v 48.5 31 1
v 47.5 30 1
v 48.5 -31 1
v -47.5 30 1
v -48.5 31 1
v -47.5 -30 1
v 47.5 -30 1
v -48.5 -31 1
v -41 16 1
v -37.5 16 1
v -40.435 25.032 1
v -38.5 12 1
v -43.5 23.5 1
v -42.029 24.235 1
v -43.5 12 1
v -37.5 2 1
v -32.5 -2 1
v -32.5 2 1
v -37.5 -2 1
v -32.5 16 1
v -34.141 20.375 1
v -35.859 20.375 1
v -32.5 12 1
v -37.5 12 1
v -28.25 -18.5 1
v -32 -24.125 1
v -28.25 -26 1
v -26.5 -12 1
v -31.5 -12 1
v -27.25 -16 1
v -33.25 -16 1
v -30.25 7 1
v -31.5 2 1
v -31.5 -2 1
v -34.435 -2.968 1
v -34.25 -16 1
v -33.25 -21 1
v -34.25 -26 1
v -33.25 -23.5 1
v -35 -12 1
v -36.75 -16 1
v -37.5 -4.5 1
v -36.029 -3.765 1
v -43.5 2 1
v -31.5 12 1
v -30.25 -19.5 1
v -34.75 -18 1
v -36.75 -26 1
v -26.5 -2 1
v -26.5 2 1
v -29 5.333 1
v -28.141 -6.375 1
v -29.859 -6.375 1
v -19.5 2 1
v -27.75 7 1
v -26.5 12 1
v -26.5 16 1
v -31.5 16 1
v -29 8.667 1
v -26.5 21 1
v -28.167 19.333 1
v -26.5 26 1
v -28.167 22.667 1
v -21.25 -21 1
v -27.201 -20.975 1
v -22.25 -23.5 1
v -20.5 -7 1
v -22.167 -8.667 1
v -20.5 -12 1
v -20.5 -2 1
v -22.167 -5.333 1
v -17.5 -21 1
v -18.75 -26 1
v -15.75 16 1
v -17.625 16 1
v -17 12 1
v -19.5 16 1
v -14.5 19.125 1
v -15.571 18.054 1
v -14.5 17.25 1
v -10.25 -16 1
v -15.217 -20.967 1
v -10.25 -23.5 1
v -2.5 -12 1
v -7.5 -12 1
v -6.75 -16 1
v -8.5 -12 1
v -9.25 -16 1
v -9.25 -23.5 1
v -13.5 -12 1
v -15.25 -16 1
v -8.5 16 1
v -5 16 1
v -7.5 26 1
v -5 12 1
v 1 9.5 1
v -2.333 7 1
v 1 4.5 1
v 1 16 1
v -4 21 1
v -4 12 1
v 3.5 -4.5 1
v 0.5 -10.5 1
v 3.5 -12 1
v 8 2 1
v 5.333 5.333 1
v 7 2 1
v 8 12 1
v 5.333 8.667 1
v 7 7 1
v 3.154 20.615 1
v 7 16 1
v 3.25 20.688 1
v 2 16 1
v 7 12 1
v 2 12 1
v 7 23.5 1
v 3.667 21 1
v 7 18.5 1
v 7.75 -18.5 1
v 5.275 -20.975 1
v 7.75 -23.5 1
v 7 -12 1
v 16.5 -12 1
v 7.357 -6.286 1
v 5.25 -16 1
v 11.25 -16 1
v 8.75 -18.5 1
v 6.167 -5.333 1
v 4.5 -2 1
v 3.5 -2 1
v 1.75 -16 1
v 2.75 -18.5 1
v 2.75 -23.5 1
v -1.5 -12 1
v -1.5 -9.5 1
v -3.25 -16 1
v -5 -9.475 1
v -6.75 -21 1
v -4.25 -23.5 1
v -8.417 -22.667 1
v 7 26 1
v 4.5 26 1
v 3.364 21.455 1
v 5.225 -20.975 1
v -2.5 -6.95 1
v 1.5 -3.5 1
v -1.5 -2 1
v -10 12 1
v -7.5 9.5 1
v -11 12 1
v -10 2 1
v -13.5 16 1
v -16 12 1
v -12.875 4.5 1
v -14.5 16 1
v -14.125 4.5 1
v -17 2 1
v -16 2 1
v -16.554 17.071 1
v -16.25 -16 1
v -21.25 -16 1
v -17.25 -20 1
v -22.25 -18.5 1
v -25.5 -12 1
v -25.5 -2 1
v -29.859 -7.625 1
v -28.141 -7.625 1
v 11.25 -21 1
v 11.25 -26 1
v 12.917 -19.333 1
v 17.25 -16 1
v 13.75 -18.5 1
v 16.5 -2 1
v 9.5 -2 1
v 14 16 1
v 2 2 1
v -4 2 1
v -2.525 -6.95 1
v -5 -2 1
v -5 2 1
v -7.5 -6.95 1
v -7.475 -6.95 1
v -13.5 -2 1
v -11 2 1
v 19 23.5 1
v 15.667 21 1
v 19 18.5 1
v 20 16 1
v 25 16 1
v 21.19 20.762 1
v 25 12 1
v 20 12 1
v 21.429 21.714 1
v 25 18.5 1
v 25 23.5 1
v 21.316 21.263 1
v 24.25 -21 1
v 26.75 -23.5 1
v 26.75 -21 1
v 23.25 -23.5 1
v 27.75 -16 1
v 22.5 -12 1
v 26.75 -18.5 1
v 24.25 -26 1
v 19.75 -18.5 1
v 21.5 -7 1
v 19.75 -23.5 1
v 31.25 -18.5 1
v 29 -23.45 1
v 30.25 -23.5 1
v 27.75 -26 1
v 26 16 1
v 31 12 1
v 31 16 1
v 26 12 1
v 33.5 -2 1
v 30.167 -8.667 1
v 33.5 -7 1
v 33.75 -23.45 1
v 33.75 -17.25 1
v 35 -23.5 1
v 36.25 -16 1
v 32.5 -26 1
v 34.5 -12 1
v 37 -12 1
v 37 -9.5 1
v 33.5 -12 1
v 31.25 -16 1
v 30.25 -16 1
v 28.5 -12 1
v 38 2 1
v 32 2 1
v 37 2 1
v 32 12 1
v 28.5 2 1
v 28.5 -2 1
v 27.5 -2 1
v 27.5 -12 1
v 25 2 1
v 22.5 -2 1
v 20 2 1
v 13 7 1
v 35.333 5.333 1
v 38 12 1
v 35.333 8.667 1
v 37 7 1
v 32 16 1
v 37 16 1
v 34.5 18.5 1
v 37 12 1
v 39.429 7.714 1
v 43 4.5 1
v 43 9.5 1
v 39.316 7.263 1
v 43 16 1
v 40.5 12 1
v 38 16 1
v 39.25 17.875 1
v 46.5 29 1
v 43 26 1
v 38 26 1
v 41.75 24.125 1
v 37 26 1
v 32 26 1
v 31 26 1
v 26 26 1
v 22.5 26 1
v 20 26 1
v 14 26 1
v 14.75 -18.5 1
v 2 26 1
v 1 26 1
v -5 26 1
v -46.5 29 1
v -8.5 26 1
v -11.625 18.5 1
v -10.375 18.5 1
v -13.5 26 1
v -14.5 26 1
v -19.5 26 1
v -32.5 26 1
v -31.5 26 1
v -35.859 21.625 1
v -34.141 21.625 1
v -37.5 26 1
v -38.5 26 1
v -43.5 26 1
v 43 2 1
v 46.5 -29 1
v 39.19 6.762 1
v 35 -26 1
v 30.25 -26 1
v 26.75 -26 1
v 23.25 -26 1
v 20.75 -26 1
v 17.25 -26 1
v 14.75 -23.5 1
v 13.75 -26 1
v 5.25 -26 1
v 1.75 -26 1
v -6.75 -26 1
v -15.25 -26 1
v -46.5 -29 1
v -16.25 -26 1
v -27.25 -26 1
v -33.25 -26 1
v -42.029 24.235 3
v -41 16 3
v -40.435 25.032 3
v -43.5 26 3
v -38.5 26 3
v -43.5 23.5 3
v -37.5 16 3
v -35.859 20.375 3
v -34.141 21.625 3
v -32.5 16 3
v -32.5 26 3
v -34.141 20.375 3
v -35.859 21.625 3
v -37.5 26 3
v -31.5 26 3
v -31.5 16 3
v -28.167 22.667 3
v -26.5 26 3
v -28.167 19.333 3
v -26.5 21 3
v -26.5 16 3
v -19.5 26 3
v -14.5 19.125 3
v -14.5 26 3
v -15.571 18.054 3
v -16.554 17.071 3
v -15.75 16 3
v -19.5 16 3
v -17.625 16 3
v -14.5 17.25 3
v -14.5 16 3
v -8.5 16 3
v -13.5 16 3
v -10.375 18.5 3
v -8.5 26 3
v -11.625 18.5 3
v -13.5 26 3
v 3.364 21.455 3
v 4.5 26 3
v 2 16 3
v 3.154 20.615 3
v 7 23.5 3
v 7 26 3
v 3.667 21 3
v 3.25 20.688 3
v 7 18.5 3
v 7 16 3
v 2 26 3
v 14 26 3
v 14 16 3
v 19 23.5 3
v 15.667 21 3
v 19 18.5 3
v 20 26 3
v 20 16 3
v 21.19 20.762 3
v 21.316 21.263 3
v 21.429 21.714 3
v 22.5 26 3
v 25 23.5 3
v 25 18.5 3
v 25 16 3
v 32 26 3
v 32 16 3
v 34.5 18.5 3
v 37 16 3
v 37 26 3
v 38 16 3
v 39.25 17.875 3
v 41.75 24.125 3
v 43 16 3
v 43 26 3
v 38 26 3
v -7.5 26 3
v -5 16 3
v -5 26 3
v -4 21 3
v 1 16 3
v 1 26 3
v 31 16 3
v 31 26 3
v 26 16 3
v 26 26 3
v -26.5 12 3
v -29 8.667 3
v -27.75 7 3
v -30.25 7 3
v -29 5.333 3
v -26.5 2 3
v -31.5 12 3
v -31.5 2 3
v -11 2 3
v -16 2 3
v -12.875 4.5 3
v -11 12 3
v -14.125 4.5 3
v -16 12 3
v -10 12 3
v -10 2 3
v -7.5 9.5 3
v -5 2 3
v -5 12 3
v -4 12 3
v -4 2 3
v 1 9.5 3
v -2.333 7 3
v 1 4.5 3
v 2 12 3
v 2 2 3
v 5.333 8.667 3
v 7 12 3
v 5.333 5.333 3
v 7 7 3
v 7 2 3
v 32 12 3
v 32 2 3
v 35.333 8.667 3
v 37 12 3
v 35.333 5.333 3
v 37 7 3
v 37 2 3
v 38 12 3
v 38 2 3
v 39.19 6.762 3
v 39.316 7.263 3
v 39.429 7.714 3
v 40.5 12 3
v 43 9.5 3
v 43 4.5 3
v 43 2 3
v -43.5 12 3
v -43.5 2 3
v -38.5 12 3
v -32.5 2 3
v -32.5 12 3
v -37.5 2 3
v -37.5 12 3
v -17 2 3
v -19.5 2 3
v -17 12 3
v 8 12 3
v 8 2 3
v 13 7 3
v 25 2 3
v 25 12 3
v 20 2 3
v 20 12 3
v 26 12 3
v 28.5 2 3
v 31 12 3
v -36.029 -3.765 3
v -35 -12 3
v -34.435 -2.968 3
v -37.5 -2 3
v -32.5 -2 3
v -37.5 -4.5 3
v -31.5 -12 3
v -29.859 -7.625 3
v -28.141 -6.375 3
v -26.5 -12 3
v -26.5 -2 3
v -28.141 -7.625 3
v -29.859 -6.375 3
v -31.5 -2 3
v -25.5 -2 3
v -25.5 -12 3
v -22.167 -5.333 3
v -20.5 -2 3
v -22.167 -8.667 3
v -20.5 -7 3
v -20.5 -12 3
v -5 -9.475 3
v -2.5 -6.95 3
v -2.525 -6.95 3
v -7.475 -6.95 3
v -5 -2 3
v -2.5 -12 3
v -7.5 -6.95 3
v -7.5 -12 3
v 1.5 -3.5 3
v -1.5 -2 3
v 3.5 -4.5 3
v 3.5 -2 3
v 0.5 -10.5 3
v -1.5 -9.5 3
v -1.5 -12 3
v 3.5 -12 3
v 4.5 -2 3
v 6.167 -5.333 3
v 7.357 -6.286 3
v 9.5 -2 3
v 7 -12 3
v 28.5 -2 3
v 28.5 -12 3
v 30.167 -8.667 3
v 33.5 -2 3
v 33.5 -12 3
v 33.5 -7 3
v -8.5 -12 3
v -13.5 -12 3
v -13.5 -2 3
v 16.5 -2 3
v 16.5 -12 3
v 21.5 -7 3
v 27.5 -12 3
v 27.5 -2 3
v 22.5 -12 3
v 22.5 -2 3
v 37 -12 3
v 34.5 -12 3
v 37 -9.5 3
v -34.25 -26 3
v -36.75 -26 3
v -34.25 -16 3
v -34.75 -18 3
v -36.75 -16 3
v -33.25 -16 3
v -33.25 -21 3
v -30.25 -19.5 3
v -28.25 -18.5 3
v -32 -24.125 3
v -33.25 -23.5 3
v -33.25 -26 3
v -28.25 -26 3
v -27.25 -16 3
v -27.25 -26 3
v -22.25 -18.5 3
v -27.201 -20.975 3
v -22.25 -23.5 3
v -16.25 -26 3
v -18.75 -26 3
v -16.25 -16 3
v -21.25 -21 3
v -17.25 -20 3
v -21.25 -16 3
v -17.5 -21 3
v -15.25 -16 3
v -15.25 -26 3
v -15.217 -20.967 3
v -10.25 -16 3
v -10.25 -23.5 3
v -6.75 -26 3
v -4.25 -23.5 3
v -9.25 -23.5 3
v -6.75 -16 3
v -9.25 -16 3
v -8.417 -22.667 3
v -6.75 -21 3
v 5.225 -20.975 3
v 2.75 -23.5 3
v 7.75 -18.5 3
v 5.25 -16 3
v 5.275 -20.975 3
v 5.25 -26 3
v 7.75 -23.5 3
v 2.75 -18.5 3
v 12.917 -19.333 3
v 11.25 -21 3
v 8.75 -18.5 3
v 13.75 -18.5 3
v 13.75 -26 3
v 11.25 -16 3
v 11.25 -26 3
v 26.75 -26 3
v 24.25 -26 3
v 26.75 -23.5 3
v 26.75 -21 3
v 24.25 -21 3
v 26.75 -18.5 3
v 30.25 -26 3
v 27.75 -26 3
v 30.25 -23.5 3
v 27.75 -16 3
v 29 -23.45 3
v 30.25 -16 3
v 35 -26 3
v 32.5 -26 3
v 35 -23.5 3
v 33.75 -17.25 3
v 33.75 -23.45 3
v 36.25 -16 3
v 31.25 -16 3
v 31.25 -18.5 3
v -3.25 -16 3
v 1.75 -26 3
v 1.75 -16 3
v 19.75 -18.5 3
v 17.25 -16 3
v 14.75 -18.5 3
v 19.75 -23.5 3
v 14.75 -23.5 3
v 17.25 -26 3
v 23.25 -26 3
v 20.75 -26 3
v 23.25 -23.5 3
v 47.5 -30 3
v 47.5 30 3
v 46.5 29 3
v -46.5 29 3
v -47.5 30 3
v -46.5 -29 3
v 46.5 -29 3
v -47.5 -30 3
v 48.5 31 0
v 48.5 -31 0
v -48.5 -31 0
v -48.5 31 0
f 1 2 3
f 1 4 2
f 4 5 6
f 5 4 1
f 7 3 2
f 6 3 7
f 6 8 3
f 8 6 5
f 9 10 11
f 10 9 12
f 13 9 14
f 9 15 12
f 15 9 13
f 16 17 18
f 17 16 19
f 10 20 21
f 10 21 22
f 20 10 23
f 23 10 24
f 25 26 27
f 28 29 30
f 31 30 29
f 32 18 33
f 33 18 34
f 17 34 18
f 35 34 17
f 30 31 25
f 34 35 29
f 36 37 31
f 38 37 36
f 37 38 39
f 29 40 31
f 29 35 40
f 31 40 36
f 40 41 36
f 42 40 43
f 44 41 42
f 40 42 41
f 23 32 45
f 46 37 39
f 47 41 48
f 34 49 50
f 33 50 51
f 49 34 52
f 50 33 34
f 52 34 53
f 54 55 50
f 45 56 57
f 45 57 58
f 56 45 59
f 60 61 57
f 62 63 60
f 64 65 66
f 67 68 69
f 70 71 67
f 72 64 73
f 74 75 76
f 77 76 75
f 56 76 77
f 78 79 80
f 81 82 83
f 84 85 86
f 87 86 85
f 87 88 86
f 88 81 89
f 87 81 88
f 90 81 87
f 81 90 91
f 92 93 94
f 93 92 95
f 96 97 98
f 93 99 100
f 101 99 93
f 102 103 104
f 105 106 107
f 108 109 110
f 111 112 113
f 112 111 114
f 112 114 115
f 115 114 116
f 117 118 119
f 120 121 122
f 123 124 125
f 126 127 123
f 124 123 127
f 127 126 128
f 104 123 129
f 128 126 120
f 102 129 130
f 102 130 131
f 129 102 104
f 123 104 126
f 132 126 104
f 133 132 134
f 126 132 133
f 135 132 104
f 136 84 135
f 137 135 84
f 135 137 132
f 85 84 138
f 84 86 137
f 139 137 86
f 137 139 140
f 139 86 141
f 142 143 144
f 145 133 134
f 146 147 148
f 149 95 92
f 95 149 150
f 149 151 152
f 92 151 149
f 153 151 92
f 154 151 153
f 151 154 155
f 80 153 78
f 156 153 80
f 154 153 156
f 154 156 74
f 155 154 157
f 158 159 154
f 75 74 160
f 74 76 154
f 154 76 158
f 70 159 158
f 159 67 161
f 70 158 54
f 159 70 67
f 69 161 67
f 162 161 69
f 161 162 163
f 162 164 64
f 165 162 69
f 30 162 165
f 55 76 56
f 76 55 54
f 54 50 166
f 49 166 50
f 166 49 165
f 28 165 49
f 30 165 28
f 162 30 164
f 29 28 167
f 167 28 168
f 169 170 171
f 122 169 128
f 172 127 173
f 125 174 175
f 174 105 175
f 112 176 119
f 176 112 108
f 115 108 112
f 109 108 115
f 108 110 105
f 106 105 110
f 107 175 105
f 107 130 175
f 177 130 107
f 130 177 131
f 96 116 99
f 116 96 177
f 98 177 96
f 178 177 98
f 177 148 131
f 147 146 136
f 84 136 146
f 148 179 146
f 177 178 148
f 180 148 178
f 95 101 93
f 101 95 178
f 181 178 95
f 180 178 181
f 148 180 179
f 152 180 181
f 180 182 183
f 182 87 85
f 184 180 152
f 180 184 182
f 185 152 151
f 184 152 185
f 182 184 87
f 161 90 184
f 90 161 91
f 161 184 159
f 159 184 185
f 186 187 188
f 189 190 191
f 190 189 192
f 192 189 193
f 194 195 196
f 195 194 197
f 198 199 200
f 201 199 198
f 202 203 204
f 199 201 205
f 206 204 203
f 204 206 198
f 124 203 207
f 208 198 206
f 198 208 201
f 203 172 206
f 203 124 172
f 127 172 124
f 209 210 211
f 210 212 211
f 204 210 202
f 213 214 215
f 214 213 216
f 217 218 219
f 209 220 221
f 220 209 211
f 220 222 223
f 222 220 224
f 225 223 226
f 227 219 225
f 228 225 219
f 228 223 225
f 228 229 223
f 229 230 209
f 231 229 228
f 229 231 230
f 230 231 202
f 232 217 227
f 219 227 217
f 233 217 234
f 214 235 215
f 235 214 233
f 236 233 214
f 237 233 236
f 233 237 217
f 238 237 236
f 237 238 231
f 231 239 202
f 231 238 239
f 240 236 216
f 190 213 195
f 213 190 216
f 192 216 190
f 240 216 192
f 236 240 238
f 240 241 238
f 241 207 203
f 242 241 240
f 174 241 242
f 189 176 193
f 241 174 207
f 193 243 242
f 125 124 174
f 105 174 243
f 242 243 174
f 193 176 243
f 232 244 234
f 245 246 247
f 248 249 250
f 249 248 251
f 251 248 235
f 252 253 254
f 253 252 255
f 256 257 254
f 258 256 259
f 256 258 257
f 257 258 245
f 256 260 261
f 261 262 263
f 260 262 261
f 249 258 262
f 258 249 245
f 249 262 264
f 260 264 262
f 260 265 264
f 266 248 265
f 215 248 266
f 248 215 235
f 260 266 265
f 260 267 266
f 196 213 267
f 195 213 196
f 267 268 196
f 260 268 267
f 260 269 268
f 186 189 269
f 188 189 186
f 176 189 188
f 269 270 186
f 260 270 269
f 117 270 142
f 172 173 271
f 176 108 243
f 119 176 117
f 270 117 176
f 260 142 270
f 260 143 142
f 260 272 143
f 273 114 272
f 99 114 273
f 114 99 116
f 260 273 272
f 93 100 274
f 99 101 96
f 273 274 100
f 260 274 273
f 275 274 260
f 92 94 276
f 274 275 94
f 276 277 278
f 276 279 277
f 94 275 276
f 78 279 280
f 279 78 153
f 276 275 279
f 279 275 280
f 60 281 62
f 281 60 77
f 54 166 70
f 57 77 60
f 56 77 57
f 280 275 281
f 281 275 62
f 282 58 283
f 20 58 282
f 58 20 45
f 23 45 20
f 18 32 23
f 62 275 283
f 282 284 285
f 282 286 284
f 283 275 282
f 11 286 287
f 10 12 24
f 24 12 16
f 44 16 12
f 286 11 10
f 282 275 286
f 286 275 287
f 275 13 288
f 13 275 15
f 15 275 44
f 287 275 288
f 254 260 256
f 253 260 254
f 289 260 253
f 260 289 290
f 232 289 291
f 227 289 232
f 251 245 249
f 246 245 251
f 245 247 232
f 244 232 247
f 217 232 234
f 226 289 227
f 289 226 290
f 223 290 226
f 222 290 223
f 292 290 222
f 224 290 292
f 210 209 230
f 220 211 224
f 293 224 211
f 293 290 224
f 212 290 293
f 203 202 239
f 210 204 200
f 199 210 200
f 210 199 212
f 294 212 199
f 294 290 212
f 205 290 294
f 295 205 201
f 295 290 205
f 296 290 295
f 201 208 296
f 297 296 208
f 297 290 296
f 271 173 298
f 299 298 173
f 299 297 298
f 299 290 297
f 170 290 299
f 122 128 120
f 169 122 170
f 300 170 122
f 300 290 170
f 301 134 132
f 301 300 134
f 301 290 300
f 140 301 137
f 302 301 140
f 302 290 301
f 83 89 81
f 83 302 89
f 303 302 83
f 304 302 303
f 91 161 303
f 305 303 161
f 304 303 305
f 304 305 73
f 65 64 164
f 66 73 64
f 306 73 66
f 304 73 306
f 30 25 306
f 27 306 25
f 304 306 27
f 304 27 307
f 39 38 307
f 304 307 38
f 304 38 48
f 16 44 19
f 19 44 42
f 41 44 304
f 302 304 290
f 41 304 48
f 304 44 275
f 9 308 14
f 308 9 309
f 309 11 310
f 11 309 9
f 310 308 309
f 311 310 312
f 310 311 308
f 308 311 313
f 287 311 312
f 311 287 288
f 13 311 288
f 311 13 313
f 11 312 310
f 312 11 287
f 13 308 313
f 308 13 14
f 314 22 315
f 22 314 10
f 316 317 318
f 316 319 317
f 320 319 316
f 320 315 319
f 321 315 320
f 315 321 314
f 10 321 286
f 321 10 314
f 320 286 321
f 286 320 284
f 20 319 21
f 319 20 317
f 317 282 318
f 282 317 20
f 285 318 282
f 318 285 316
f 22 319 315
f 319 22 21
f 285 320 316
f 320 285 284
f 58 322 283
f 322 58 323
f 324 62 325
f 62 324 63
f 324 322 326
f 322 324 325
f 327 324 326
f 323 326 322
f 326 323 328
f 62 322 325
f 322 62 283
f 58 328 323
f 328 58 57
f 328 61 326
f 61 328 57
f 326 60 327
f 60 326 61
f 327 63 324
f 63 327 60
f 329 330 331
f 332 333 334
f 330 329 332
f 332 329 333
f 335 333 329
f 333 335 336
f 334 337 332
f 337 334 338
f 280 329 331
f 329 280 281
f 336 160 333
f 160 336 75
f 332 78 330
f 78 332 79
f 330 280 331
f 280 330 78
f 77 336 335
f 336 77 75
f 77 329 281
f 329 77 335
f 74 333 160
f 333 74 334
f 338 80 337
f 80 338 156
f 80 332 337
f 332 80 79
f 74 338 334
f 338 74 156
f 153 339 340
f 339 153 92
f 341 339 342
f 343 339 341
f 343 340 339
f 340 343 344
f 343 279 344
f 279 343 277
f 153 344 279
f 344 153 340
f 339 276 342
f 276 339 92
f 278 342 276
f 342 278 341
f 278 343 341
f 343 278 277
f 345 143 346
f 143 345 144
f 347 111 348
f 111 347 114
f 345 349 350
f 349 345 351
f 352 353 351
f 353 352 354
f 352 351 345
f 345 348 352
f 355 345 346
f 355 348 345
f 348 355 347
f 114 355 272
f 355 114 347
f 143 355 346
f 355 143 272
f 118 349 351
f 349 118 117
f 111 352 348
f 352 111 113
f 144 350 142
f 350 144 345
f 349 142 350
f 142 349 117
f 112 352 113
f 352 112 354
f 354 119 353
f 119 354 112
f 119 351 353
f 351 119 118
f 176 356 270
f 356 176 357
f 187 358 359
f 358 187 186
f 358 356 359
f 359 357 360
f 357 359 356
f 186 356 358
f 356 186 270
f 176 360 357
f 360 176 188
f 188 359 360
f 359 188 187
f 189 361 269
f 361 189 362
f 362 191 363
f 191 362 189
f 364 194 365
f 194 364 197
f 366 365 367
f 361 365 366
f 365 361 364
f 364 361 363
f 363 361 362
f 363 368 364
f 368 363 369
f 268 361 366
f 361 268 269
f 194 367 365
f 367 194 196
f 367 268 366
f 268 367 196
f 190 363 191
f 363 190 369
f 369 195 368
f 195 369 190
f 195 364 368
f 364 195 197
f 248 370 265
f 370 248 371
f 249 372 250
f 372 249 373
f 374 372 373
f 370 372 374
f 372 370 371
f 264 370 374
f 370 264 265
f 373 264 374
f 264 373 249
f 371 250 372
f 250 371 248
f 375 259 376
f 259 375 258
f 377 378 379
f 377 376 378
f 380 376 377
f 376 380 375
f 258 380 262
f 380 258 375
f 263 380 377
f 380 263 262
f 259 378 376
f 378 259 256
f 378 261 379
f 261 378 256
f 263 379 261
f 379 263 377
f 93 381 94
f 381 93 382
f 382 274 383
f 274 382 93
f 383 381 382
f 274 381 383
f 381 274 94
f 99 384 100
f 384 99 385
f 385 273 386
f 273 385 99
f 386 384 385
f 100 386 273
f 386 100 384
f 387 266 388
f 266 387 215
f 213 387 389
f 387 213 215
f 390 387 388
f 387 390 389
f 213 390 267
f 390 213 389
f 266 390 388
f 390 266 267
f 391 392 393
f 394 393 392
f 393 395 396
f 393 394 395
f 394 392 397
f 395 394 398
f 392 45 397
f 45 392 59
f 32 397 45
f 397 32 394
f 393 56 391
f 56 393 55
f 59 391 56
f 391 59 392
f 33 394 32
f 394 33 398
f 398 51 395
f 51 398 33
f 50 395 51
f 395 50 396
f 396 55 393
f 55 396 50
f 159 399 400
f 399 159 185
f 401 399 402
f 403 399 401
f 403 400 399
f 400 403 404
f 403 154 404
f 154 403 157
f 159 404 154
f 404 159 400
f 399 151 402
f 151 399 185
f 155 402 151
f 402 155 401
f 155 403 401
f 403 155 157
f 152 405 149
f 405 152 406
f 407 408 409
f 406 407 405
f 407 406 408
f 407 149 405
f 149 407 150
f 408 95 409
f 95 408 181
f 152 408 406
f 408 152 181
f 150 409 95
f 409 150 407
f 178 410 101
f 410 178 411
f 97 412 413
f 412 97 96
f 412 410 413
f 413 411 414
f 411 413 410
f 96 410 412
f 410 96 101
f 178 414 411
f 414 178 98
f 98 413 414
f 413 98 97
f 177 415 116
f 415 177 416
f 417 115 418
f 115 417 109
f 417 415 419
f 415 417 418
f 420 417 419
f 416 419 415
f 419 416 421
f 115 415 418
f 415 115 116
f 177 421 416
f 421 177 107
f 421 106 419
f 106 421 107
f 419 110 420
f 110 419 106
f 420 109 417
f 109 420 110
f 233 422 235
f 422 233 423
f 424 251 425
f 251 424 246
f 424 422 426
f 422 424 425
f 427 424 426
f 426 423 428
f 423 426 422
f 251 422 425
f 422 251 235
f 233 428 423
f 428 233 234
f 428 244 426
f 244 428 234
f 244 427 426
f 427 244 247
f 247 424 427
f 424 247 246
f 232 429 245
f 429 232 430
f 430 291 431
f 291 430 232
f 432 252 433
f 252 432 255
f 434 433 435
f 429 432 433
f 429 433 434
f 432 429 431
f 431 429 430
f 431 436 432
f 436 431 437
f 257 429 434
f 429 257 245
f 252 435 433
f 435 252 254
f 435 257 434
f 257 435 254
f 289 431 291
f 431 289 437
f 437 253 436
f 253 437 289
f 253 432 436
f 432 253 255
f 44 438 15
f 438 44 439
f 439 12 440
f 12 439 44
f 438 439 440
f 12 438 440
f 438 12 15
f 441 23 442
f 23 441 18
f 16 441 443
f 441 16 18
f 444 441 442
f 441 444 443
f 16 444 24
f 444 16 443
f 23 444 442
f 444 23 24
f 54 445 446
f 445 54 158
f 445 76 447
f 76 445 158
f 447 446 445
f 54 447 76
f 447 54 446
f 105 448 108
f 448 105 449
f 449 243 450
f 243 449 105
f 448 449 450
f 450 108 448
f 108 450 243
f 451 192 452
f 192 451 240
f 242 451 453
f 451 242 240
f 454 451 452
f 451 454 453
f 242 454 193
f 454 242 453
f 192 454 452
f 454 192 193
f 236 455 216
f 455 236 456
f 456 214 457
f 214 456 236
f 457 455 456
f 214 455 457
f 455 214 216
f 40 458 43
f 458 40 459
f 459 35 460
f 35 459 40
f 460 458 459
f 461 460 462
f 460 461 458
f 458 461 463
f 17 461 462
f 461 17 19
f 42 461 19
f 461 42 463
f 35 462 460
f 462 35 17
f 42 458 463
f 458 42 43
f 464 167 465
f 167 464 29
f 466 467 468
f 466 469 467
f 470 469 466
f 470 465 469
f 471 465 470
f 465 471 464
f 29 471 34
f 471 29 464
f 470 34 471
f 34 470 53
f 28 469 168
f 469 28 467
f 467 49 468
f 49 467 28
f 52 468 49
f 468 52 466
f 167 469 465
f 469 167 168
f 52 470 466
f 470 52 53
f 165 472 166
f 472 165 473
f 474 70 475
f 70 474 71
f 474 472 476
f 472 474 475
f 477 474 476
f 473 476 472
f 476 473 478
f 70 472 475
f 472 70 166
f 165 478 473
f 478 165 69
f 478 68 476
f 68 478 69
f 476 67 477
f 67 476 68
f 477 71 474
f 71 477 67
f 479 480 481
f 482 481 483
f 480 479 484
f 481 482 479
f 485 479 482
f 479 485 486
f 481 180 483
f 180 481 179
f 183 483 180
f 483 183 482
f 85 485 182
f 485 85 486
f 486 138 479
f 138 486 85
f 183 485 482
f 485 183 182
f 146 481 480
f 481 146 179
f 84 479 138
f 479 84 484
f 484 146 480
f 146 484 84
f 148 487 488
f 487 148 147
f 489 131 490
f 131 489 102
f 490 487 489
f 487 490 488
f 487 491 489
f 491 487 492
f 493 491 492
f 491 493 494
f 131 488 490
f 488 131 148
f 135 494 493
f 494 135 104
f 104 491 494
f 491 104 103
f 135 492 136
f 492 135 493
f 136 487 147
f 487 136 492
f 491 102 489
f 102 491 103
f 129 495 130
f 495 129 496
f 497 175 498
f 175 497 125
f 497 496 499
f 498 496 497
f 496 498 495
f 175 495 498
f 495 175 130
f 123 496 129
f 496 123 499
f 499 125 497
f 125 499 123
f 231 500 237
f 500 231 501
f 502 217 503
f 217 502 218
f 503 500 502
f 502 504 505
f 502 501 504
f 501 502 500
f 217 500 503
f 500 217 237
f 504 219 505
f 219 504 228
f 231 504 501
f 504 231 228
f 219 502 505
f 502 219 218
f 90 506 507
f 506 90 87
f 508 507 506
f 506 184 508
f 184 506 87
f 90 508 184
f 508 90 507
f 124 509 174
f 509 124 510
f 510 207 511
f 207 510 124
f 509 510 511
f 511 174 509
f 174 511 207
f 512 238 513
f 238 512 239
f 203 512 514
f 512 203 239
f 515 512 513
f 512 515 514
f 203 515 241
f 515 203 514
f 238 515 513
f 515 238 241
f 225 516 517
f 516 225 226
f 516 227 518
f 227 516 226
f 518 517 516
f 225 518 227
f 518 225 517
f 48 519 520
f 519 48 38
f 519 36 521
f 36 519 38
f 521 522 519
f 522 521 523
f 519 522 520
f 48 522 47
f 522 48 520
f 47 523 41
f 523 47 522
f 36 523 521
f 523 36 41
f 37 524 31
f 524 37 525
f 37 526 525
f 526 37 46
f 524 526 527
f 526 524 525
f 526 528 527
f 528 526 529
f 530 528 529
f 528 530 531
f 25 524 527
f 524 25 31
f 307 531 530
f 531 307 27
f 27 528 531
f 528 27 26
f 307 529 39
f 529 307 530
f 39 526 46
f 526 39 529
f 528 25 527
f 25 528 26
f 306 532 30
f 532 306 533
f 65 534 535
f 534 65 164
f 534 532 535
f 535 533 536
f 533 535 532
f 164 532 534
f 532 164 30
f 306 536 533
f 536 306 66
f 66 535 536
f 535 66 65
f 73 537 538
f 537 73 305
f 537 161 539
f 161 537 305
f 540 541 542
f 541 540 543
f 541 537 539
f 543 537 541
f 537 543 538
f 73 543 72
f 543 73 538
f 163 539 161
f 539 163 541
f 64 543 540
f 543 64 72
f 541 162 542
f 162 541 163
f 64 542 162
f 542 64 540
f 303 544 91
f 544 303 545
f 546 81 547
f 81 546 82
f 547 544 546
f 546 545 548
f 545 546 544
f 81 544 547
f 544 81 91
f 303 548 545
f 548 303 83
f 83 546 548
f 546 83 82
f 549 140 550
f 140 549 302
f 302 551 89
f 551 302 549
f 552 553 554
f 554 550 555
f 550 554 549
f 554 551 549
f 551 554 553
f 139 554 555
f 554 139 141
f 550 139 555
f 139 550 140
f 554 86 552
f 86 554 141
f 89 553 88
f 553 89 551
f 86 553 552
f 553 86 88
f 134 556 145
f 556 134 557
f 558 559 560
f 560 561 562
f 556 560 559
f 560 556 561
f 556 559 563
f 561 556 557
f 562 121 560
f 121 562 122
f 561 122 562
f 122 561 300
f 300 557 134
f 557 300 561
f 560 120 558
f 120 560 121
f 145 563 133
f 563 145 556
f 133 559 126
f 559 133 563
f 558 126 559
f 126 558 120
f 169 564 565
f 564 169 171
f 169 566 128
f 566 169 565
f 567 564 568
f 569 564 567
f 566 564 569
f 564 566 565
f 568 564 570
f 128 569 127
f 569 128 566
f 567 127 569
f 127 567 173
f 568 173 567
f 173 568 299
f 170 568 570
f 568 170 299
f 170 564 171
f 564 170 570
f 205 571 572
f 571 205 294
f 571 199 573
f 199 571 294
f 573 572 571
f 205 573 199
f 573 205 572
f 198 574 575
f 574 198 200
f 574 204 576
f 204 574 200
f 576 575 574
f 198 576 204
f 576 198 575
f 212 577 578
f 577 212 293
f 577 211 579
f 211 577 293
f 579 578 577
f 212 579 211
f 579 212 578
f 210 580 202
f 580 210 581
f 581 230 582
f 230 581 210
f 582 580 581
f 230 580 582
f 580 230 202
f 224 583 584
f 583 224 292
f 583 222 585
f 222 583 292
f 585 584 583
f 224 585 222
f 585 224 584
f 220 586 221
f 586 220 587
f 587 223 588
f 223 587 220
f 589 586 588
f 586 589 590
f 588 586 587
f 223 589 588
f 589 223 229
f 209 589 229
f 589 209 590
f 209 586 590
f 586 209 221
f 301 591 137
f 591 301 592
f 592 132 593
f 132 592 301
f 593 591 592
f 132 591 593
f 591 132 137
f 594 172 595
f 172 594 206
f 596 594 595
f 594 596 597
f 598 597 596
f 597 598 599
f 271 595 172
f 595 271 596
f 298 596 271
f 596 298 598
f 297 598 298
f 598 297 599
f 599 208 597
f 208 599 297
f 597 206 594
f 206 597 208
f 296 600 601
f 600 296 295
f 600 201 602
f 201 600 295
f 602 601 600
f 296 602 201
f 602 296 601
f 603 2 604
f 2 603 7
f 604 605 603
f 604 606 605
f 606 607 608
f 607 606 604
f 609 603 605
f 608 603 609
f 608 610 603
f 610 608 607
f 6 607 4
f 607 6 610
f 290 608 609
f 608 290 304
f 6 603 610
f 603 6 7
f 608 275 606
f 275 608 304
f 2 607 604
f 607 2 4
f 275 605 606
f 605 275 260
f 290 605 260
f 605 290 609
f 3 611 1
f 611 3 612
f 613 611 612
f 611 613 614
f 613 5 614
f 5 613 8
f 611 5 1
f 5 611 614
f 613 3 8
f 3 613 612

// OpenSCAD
// lowpolyfont v1_0
// GPLv2
// (c) 2013 TakeItAndRun
//
// v1_1: 
//

/*





*/
//*******************************************************
//
// Low polygon count font
//
//*******************************************************



//*******************************************************
//
// basic definitions
//
//*******************************************************


// small displacement to avoid parallel faces with zero volume
e=+0.02;

// unit vectors
xaxis=+[1,0,0];
yaxis=+[0,1,0];
zaxis=+[0,0,1];

//*******************************************************
//
// dimensions
//
//*******************************************************

/* [text] */

//number of lines
nl=4;//[1:4]

// Text (ONLY CAPITALS!)
text1="THE QUICK BROWN";
text2="FOX JUMBED OVER";
text3="THE LAZY DOG.";
text4="1234567890.:!?";



/* [type] */

//thickness of type
t=2;//[.1:10]

//height of type
h=10;//[1:50]

//width of type
w=5;//[1:50]

//spacing between letters
d=1;//[0.0:5.0]
dpos=d;

//conical shape
//pq=40;//[0:100]
//q=pq/100;

// spacing between lines
dl=4;//[0.0:10:0]

/* [sign] */

// sign
sign=!false;//[false:none,true:sign]
//length past type
dsx=3;//[0:10]
//height above type
dsy=3;//[0:10]
//thickness of the sign
sz=1;//[1:10]
// edge
edge=!false;//[false:none,true:sign]
// width of edge
we=1;//[0.1:10.0]


/* [Hidden] */

text=["",text1,text2,text3,text4];


//*******************************************************
//
// polygons of the letters:
//	Every letter is one element of the array fo:
// the first number is the width of the letter
//	then follows a list of polygons
//
//	the key to the (order of the) letters is the string str0
//
//*******************************************************

str0=" ABCDEFGHIJKLMNOPQRSTUVWXYZ1234567890.:!?";

fo=
[
[
// space
2,
[],

],[
//A
2,
[[0,2],[1,4],[2,2]],
[[0,2+e],[2,2+e],[0,0]],
[[0,2+e],[2,2+e],[2,0]],
],[
//B
2,
[[0,4],[2,3],[0,1.5]],
[[0,2.5],[2,1],[0,0]],
],[
//C
2,
[[0,2],[2,4],[2,0]],
],[
//D
2,
[[0,4],[2,2],[0,0]],
],[
//E
2,
[[0,4],[2,4],[0,0]],
[[0,4],[2,0],[0,0]],
[[0,4],[2,2],[0,0]],
],[
//F
2,
[[0,4],[2,4],[0,0]],
],[
//G
2,
[[0,4],[2,4],[0,0]],
[[0,1],[2,2],[2,0],[0,0]],
],[
//H
2,
[[0,4],[.75,2],[0,0]],
[[1.25,2],[2,4],[2,0]],
[[0,2.25],[2,2.25],[2,1.75],[0,1.75]],
],[
//I
1,
[[0,4],[1,4],[1,0]],
],[
//J
1,
[[1,4],[1,0],[0,0]],
],[
//K
2,
[[0,4],[1,4],[0,0]],
[[0,1.5],[2,4],[2,3]],
[[0,2.5],[2,1],[2,0]],
],[
//L
2,
[[0,4],[2,0],[0,0]],
],[
//M
2,
[[0,4],[2,2],[2,0],[0,0]],
[[2,4],[2,0],[0,0],[0,2]],
],[
//N
2,
[[0,4],[2,3],[0,0]],
[[0,1],[2,4],[2,0]],
],[
//O
2,
[[0,4],[2,4],[2,0],[0,0]],
],[
//P
2,
[[1,4],[2,3],[0,2]],
[[0,4],[1,4],[0,0]],
],[
//Q
2,
[[0,4],[2,4],[2,1.25],[.75,0],[0,0]],
[[0,2],[2,.5],[2,0],[1.5,0]],
//[[1.5,1],[2,0],[1,.5]],
],[
//R
2,
[[0,4],[1,4],[0,0]],
[[0,2],[1,4],[2,3]],
[[0,2.5],[2,1],[2,0]],
],[
//S
2,
[[2,4],[2,1.5],[0,3]],
[[0,2.5],[2,1],[0,0]],
],[
//T
2,
[[0.5,4],[1.25,4],[1,0]],
[[0,4],[2,4],[0,3]],
],[
//U
2,
[[0,4],[1,0],[0,0]],
[[2,4],[2,0],[1,0]],
[[0,0],[0,1],[2,1],[2,0]],
],[
//V
2,
[[0,4],[2,4],[1,0]],
],[
//W
2,
[[0,4],[2,4],[2,0],[0,2]],
[[0,4],[2,4],[2,2],[0,0]],
],[
//X
2,
[[0,4],[1.5,2],[.5,2]],
[[2,4],[1.5,2],[.5,2]],
[[0,0],[.5,2],[1.5,2]],
[[2,0],[.5,2],[1.5,2]],
],[
//Y
2,
[[0,4],[2,4],[1,2]],
[[0.5,4],[1.25,4],[1,0]],
],[
//Z
2,
[[0,4],[2,4],[2,3]],
[[0,0],[0,1],[2,0]],
[[0,1],[1.5,4],[2,3],[.5,0]],
],[
//1
1,
[[0,0],[1,4],[1,0]],
[[0,4],[1,4],[1,3]],
],[
//2
2,
[[0,4],[2,3],[0,2]],
[[0,0],[0,1],[2,0]],
[[0,1],[1.5,3],[2,3],[0,0]],
],[
//3
2,
[[0,4],[2,3],[0,2]],
[[0,0],[0,2+e],[2,1]],
],[
//4
2,
[[1,0],[2,4],[2,0]],
[[0,4],[2,2],[0,2]],
],[
//5
2,
[[0,4],[2,4],[0,2]],
[[0,0],[0,2+e],[2,1]],
],[
//6
2,
[[1,0],[0,1],[1,2],[2,1]],
[[0,4],[1,4],[.25,1],[0,1]],
],[
//7
2,
//[[0,4],[2,4],[2,3.5],[0,3]],
//[[0,4],[1,4],[.25,1],[0,1]],
[[0,4],[2,4],[2,0]],
],[
//8
2,
[[1,0],[0,1],[1,2+e],[2,1]],
[[1,4],[2,3],[1,2],[0,3]],
],[
//9
2,
[[1,4],[2,3],[1,2],[0,3]],
[[1,0],[1.75,3],[2,3],[2,0]],
],[
//0
2,
[[1,0],[0,1],[0,3],[1,4],[2,3],[2,1]],
],[
//.
1,
[[0,0],[1,1],[1,0]],
],[
//:
1,
[[0,0],[1,1],[1,0]],
[[0,2],[1,3],[1,2]],
],[
//!
1,
[[0,0],[1,1],[1,0]],
[[0,4],[1,4],[.5,1+e]],
],[
//?
2,
[[0.5,0],[1.5,1],[1.5,0]],
[[1,4],[2,4],[1,1+e]],
[[0,4],[2,4],[0,3]],
],[

]
];


//*******************************************************
//
// routines
//
//*******************************************************

// make the i-th letter in the string str0
module letter(s){
	for(i=[1:len(fo[s])-1]){
// comment out the line with linear_extrude to get a 2-dim output for a dxf export
	linear_extrude(height=t)
		scale([w/2,h/4])polygon(fo[s][i]);
	}
}

// print one line of text 
// str: text to be printed (use only letters that are included in the string str0 (capital letters, numbers, some special characters)
module type(str,center=false){
	translate([(center)?-(pos(len(str),str)-dpos/2)/2:0,(center)?-h/2:0,0])
	for(i=[0:len(str)-1]){
		translate(pos(i,str)*xaxis)
		letter(index(str[i],str0));
	}
}


module sign(){
// calculate x,y-dimensions of the sign
	ssx=maximum(nl)+2*dsx+((edge)?4*we:0);
	ssy=nl*h+(nl-1)*dl+2*dsy+((edge)?4*we:0);

	color("yellow")
	translate((nl-1)*(h+dl)/2*yaxis+((sign)?sz:0)*zaxis)
	for (i=[1:nl]){
		translate(-(i-1)*(h+dl)*yaxis)
			type(text[i],true);
	}
	if (sign){
		color("blue")
		translate(sz/2*zaxis)
			cube([ssx,ssy,sz],true);
		color("yellow")
		translate((sz+t/2)*zaxis)
			for(m=[-1,1]){
				translate(m*(ssy-3*we)/2*yaxis)
					cube([ssx-2*we,we,t],true);
				translate(m*(ssx-3*we)/2*xaxis)
					cube([we,ssy-2*we,t],true);
			}
	}
}



// get the length of the longest line
function maximum(nl,i=1)=(i<nl)?
	max((pos(len(text[i]),text[i])-dpos/2),maximum(nl,i+1)):
	(pos(len(text[i]),text[i])-dpos/2)
;

// return index of a letter in the fo vector / string str0
function index(str)=
	search(str,str0)[0];


// Calculate the position of the i-th letter as sum of the
// width plus spacing of all the letters before it.
// This function looks so witty because OpenSCAD does not
// allow re-assignment of variables during run time.
// The idea for this function (somewhat simplified) I took from
// http://www.thingiverse.com/thing:22730
// by Bernhard -HotKey- Slawik, http://www.bernhardslawik.de
// This function is defined only for 80 characters. You may 
// expand it if you need more than 80 characters per line.
function pos(i,str)=
	w/2*(
	(i==0)?0:i*dpos*2/w
	+((i>=1)?fo[index(str[0])][0]:0)
	+((i>=2)?fo[index(str[1])][0]:0)
	+((i>=3)?fo[index(str[2])][0]:0)
	+((i>=4)?fo[index(str[3])][0]:0)
	+((i>=5)?fo[index(str[4])][0]:0)
	+((i>=6)?fo[index(str[5])][0]:0)
	+((i>=7)?fo[index(str[6])][0]:0)
	+((i>=8)?fo[index(str[7])][0]:0)
	+((i>=9)?fo[index(str[8])][0]:0)
	+((i>=10)?fo[index(str[9])][0]:0)
	+((i>=11)?fo[index(str[10])][0]:0)
	+((i>=12)?fo[index(str[11])][0]:0)
	+((i>=13)?fo[index(str[12])][0]:0)
	+((i>=14)?fo[index(str[13])][0]:0)
	+((i>=15)?fo[index(str[14])][0]:0)
	+((i>=16)?fo[index(str[15])][0]:0)
	+((i>=17)?fo[index(str[16])][0]:0)
	+((i>=18)?fo[index(str[17])][0]:0)
	+((i>=19)?fo[index(str[18])][0]:0)
	+((i>=20)?fo[index(str[19])][0]:0)
	+((i>=21)?fo[index(str[20])][0]:0)
	+((i>=22)?fo[index(str[21])][0]:0)
	+((i>=23)?fo[index(str[22])][0]:0)
	+((i>=24)?fo[index(str[23])][0]:0)
	+((i>=25)?fo[index(str[24])][0]:0)
	+((i>=26)?fo[index(str[25])][0]:0)
	+((i>=27)?fo[index(str[26])][0]:0)
	+((i>=28)?fo[index(str[27])][0]:0)
	+((i>=29)?fo[index(str[28])][0]:0)
	+((i>=30)?fo[index(str[29])][0]:0)
	+((i>=31)?fo[index(str[30])][0]:0)
	+((i>=32)?fo[index(str[31])][0]:0)
	+((i>=33)?fo[index(str[32])][0]:0)
	+((i>=34)?fo[index(str[33])][0]:0)
	+((i>=35)?fo[index(str[34])][0]:0)
	+((i>=36)?fo[index(str[35])][0]:0)
	+((i>=37)?fo[index(str[36])][0]:0)
	+((i>=38)?fo[index(str[37])][0]:0)
	+((i>=39)?fo[index(str[38])][0]:0)
	+((i>=40)?fo[index(str[39])][0]:0)
	+((i>=41)?fo[index(str[40])][0]:0)
	+((i>=42)?fo[index(str[41])][0]:0)
	+((i>=43)?fo[index(str[42])][0]:0)
	+((i>=44)?fo[index(str[43])][0]:0)
	+((i>=45)?fo[index(str[44])][0]:0)
	+((i>=46)?fo[index(str[45])][0]:0)
	+((i>=47)?fo[index(str[46])][0]:0)
	+((i>=48)?fo[index(str[47])][0]:0)
	+((i>=49)?fo[index(str[48])][0]:0)
	+((i>=50)?fo[index(str[49])][0]:0)
	+((i>=51)?fo[index(str[50])][0]:0)
	+((i>=52)?fo[index(str[51])][0]:0)
	+((i>=53)?fo[index(str[52])][0]:0)
	+((i>=54)?fo[index(str[53])][0]:0)
	+((i>=55)?fo[index(str[54])][0]:0)
	+((i>=56)?fo[index(str[55])][0]:0)
	+((i>=57)?fo[index(str[56])][0]:0)
	+((i>=58)?fo[index(str[57])][0]:0)
	+((i>=59)?fo[index(str[58])][0]:0)
	+((i>=60)?fo[index(str[59])][0]:0)
	+((i>=61)?fo[index(str[60])][0]:0)
	+((i>=62)?fo[index(str[61])][0]:0)
	+((i>=63)?fo[index(str[62])][0]:0)
	+((i>=64)?fo[index(str[63])][0]:0)
	+((i>=65)?fo[index(str[64])][0]:0)
	+((i>=66)?fo[index(str[65])][0]:0)
	+((i>=67)?fo[index(str[66])][0]:0)
	+((i>=68)?fo[index(str[67])][0]:0)
	+((i>=69)?fo[index(str[68])][0]:0)
	+((i>=70)?fo[index(str[69])][0]:0)
	+((i>=71)?fo[index(str[70])][0]:0)
	+((i>=72)?fo[index(str[71])][0]:0)
	+((i>=73)?fo[index(str[72])][0]:0)
	+((i>=74)?fo[index(str[73])][0]:0)
	+((i>=75)?fo[index(str[74])][0]:0)
	+((i>=76)?fo[index(str[75])][0]:0)
	+((i>=77)?fo[index(str[76])][0]:0)
	+((i>=78)?fo[index(str[77])][0]:0)
	+((i>=79)?fo[index(str[78])][0]:0)
	+((i>=80)?fo[index(str[79])][0]:0)
	)
//	+((i>=4)?fo[index(str[4])][0]:0)

;


//*******************************************************
//
// main program
//
//*******************************************************



// one line of text
//str="THE QUICK BROWN FOX JUMBED OVER THE LAZY DOG.";
//str=str0;
//type(str,!true);

// sign with up to 4 lines of text (if sign=true, else just the text)
sign();
